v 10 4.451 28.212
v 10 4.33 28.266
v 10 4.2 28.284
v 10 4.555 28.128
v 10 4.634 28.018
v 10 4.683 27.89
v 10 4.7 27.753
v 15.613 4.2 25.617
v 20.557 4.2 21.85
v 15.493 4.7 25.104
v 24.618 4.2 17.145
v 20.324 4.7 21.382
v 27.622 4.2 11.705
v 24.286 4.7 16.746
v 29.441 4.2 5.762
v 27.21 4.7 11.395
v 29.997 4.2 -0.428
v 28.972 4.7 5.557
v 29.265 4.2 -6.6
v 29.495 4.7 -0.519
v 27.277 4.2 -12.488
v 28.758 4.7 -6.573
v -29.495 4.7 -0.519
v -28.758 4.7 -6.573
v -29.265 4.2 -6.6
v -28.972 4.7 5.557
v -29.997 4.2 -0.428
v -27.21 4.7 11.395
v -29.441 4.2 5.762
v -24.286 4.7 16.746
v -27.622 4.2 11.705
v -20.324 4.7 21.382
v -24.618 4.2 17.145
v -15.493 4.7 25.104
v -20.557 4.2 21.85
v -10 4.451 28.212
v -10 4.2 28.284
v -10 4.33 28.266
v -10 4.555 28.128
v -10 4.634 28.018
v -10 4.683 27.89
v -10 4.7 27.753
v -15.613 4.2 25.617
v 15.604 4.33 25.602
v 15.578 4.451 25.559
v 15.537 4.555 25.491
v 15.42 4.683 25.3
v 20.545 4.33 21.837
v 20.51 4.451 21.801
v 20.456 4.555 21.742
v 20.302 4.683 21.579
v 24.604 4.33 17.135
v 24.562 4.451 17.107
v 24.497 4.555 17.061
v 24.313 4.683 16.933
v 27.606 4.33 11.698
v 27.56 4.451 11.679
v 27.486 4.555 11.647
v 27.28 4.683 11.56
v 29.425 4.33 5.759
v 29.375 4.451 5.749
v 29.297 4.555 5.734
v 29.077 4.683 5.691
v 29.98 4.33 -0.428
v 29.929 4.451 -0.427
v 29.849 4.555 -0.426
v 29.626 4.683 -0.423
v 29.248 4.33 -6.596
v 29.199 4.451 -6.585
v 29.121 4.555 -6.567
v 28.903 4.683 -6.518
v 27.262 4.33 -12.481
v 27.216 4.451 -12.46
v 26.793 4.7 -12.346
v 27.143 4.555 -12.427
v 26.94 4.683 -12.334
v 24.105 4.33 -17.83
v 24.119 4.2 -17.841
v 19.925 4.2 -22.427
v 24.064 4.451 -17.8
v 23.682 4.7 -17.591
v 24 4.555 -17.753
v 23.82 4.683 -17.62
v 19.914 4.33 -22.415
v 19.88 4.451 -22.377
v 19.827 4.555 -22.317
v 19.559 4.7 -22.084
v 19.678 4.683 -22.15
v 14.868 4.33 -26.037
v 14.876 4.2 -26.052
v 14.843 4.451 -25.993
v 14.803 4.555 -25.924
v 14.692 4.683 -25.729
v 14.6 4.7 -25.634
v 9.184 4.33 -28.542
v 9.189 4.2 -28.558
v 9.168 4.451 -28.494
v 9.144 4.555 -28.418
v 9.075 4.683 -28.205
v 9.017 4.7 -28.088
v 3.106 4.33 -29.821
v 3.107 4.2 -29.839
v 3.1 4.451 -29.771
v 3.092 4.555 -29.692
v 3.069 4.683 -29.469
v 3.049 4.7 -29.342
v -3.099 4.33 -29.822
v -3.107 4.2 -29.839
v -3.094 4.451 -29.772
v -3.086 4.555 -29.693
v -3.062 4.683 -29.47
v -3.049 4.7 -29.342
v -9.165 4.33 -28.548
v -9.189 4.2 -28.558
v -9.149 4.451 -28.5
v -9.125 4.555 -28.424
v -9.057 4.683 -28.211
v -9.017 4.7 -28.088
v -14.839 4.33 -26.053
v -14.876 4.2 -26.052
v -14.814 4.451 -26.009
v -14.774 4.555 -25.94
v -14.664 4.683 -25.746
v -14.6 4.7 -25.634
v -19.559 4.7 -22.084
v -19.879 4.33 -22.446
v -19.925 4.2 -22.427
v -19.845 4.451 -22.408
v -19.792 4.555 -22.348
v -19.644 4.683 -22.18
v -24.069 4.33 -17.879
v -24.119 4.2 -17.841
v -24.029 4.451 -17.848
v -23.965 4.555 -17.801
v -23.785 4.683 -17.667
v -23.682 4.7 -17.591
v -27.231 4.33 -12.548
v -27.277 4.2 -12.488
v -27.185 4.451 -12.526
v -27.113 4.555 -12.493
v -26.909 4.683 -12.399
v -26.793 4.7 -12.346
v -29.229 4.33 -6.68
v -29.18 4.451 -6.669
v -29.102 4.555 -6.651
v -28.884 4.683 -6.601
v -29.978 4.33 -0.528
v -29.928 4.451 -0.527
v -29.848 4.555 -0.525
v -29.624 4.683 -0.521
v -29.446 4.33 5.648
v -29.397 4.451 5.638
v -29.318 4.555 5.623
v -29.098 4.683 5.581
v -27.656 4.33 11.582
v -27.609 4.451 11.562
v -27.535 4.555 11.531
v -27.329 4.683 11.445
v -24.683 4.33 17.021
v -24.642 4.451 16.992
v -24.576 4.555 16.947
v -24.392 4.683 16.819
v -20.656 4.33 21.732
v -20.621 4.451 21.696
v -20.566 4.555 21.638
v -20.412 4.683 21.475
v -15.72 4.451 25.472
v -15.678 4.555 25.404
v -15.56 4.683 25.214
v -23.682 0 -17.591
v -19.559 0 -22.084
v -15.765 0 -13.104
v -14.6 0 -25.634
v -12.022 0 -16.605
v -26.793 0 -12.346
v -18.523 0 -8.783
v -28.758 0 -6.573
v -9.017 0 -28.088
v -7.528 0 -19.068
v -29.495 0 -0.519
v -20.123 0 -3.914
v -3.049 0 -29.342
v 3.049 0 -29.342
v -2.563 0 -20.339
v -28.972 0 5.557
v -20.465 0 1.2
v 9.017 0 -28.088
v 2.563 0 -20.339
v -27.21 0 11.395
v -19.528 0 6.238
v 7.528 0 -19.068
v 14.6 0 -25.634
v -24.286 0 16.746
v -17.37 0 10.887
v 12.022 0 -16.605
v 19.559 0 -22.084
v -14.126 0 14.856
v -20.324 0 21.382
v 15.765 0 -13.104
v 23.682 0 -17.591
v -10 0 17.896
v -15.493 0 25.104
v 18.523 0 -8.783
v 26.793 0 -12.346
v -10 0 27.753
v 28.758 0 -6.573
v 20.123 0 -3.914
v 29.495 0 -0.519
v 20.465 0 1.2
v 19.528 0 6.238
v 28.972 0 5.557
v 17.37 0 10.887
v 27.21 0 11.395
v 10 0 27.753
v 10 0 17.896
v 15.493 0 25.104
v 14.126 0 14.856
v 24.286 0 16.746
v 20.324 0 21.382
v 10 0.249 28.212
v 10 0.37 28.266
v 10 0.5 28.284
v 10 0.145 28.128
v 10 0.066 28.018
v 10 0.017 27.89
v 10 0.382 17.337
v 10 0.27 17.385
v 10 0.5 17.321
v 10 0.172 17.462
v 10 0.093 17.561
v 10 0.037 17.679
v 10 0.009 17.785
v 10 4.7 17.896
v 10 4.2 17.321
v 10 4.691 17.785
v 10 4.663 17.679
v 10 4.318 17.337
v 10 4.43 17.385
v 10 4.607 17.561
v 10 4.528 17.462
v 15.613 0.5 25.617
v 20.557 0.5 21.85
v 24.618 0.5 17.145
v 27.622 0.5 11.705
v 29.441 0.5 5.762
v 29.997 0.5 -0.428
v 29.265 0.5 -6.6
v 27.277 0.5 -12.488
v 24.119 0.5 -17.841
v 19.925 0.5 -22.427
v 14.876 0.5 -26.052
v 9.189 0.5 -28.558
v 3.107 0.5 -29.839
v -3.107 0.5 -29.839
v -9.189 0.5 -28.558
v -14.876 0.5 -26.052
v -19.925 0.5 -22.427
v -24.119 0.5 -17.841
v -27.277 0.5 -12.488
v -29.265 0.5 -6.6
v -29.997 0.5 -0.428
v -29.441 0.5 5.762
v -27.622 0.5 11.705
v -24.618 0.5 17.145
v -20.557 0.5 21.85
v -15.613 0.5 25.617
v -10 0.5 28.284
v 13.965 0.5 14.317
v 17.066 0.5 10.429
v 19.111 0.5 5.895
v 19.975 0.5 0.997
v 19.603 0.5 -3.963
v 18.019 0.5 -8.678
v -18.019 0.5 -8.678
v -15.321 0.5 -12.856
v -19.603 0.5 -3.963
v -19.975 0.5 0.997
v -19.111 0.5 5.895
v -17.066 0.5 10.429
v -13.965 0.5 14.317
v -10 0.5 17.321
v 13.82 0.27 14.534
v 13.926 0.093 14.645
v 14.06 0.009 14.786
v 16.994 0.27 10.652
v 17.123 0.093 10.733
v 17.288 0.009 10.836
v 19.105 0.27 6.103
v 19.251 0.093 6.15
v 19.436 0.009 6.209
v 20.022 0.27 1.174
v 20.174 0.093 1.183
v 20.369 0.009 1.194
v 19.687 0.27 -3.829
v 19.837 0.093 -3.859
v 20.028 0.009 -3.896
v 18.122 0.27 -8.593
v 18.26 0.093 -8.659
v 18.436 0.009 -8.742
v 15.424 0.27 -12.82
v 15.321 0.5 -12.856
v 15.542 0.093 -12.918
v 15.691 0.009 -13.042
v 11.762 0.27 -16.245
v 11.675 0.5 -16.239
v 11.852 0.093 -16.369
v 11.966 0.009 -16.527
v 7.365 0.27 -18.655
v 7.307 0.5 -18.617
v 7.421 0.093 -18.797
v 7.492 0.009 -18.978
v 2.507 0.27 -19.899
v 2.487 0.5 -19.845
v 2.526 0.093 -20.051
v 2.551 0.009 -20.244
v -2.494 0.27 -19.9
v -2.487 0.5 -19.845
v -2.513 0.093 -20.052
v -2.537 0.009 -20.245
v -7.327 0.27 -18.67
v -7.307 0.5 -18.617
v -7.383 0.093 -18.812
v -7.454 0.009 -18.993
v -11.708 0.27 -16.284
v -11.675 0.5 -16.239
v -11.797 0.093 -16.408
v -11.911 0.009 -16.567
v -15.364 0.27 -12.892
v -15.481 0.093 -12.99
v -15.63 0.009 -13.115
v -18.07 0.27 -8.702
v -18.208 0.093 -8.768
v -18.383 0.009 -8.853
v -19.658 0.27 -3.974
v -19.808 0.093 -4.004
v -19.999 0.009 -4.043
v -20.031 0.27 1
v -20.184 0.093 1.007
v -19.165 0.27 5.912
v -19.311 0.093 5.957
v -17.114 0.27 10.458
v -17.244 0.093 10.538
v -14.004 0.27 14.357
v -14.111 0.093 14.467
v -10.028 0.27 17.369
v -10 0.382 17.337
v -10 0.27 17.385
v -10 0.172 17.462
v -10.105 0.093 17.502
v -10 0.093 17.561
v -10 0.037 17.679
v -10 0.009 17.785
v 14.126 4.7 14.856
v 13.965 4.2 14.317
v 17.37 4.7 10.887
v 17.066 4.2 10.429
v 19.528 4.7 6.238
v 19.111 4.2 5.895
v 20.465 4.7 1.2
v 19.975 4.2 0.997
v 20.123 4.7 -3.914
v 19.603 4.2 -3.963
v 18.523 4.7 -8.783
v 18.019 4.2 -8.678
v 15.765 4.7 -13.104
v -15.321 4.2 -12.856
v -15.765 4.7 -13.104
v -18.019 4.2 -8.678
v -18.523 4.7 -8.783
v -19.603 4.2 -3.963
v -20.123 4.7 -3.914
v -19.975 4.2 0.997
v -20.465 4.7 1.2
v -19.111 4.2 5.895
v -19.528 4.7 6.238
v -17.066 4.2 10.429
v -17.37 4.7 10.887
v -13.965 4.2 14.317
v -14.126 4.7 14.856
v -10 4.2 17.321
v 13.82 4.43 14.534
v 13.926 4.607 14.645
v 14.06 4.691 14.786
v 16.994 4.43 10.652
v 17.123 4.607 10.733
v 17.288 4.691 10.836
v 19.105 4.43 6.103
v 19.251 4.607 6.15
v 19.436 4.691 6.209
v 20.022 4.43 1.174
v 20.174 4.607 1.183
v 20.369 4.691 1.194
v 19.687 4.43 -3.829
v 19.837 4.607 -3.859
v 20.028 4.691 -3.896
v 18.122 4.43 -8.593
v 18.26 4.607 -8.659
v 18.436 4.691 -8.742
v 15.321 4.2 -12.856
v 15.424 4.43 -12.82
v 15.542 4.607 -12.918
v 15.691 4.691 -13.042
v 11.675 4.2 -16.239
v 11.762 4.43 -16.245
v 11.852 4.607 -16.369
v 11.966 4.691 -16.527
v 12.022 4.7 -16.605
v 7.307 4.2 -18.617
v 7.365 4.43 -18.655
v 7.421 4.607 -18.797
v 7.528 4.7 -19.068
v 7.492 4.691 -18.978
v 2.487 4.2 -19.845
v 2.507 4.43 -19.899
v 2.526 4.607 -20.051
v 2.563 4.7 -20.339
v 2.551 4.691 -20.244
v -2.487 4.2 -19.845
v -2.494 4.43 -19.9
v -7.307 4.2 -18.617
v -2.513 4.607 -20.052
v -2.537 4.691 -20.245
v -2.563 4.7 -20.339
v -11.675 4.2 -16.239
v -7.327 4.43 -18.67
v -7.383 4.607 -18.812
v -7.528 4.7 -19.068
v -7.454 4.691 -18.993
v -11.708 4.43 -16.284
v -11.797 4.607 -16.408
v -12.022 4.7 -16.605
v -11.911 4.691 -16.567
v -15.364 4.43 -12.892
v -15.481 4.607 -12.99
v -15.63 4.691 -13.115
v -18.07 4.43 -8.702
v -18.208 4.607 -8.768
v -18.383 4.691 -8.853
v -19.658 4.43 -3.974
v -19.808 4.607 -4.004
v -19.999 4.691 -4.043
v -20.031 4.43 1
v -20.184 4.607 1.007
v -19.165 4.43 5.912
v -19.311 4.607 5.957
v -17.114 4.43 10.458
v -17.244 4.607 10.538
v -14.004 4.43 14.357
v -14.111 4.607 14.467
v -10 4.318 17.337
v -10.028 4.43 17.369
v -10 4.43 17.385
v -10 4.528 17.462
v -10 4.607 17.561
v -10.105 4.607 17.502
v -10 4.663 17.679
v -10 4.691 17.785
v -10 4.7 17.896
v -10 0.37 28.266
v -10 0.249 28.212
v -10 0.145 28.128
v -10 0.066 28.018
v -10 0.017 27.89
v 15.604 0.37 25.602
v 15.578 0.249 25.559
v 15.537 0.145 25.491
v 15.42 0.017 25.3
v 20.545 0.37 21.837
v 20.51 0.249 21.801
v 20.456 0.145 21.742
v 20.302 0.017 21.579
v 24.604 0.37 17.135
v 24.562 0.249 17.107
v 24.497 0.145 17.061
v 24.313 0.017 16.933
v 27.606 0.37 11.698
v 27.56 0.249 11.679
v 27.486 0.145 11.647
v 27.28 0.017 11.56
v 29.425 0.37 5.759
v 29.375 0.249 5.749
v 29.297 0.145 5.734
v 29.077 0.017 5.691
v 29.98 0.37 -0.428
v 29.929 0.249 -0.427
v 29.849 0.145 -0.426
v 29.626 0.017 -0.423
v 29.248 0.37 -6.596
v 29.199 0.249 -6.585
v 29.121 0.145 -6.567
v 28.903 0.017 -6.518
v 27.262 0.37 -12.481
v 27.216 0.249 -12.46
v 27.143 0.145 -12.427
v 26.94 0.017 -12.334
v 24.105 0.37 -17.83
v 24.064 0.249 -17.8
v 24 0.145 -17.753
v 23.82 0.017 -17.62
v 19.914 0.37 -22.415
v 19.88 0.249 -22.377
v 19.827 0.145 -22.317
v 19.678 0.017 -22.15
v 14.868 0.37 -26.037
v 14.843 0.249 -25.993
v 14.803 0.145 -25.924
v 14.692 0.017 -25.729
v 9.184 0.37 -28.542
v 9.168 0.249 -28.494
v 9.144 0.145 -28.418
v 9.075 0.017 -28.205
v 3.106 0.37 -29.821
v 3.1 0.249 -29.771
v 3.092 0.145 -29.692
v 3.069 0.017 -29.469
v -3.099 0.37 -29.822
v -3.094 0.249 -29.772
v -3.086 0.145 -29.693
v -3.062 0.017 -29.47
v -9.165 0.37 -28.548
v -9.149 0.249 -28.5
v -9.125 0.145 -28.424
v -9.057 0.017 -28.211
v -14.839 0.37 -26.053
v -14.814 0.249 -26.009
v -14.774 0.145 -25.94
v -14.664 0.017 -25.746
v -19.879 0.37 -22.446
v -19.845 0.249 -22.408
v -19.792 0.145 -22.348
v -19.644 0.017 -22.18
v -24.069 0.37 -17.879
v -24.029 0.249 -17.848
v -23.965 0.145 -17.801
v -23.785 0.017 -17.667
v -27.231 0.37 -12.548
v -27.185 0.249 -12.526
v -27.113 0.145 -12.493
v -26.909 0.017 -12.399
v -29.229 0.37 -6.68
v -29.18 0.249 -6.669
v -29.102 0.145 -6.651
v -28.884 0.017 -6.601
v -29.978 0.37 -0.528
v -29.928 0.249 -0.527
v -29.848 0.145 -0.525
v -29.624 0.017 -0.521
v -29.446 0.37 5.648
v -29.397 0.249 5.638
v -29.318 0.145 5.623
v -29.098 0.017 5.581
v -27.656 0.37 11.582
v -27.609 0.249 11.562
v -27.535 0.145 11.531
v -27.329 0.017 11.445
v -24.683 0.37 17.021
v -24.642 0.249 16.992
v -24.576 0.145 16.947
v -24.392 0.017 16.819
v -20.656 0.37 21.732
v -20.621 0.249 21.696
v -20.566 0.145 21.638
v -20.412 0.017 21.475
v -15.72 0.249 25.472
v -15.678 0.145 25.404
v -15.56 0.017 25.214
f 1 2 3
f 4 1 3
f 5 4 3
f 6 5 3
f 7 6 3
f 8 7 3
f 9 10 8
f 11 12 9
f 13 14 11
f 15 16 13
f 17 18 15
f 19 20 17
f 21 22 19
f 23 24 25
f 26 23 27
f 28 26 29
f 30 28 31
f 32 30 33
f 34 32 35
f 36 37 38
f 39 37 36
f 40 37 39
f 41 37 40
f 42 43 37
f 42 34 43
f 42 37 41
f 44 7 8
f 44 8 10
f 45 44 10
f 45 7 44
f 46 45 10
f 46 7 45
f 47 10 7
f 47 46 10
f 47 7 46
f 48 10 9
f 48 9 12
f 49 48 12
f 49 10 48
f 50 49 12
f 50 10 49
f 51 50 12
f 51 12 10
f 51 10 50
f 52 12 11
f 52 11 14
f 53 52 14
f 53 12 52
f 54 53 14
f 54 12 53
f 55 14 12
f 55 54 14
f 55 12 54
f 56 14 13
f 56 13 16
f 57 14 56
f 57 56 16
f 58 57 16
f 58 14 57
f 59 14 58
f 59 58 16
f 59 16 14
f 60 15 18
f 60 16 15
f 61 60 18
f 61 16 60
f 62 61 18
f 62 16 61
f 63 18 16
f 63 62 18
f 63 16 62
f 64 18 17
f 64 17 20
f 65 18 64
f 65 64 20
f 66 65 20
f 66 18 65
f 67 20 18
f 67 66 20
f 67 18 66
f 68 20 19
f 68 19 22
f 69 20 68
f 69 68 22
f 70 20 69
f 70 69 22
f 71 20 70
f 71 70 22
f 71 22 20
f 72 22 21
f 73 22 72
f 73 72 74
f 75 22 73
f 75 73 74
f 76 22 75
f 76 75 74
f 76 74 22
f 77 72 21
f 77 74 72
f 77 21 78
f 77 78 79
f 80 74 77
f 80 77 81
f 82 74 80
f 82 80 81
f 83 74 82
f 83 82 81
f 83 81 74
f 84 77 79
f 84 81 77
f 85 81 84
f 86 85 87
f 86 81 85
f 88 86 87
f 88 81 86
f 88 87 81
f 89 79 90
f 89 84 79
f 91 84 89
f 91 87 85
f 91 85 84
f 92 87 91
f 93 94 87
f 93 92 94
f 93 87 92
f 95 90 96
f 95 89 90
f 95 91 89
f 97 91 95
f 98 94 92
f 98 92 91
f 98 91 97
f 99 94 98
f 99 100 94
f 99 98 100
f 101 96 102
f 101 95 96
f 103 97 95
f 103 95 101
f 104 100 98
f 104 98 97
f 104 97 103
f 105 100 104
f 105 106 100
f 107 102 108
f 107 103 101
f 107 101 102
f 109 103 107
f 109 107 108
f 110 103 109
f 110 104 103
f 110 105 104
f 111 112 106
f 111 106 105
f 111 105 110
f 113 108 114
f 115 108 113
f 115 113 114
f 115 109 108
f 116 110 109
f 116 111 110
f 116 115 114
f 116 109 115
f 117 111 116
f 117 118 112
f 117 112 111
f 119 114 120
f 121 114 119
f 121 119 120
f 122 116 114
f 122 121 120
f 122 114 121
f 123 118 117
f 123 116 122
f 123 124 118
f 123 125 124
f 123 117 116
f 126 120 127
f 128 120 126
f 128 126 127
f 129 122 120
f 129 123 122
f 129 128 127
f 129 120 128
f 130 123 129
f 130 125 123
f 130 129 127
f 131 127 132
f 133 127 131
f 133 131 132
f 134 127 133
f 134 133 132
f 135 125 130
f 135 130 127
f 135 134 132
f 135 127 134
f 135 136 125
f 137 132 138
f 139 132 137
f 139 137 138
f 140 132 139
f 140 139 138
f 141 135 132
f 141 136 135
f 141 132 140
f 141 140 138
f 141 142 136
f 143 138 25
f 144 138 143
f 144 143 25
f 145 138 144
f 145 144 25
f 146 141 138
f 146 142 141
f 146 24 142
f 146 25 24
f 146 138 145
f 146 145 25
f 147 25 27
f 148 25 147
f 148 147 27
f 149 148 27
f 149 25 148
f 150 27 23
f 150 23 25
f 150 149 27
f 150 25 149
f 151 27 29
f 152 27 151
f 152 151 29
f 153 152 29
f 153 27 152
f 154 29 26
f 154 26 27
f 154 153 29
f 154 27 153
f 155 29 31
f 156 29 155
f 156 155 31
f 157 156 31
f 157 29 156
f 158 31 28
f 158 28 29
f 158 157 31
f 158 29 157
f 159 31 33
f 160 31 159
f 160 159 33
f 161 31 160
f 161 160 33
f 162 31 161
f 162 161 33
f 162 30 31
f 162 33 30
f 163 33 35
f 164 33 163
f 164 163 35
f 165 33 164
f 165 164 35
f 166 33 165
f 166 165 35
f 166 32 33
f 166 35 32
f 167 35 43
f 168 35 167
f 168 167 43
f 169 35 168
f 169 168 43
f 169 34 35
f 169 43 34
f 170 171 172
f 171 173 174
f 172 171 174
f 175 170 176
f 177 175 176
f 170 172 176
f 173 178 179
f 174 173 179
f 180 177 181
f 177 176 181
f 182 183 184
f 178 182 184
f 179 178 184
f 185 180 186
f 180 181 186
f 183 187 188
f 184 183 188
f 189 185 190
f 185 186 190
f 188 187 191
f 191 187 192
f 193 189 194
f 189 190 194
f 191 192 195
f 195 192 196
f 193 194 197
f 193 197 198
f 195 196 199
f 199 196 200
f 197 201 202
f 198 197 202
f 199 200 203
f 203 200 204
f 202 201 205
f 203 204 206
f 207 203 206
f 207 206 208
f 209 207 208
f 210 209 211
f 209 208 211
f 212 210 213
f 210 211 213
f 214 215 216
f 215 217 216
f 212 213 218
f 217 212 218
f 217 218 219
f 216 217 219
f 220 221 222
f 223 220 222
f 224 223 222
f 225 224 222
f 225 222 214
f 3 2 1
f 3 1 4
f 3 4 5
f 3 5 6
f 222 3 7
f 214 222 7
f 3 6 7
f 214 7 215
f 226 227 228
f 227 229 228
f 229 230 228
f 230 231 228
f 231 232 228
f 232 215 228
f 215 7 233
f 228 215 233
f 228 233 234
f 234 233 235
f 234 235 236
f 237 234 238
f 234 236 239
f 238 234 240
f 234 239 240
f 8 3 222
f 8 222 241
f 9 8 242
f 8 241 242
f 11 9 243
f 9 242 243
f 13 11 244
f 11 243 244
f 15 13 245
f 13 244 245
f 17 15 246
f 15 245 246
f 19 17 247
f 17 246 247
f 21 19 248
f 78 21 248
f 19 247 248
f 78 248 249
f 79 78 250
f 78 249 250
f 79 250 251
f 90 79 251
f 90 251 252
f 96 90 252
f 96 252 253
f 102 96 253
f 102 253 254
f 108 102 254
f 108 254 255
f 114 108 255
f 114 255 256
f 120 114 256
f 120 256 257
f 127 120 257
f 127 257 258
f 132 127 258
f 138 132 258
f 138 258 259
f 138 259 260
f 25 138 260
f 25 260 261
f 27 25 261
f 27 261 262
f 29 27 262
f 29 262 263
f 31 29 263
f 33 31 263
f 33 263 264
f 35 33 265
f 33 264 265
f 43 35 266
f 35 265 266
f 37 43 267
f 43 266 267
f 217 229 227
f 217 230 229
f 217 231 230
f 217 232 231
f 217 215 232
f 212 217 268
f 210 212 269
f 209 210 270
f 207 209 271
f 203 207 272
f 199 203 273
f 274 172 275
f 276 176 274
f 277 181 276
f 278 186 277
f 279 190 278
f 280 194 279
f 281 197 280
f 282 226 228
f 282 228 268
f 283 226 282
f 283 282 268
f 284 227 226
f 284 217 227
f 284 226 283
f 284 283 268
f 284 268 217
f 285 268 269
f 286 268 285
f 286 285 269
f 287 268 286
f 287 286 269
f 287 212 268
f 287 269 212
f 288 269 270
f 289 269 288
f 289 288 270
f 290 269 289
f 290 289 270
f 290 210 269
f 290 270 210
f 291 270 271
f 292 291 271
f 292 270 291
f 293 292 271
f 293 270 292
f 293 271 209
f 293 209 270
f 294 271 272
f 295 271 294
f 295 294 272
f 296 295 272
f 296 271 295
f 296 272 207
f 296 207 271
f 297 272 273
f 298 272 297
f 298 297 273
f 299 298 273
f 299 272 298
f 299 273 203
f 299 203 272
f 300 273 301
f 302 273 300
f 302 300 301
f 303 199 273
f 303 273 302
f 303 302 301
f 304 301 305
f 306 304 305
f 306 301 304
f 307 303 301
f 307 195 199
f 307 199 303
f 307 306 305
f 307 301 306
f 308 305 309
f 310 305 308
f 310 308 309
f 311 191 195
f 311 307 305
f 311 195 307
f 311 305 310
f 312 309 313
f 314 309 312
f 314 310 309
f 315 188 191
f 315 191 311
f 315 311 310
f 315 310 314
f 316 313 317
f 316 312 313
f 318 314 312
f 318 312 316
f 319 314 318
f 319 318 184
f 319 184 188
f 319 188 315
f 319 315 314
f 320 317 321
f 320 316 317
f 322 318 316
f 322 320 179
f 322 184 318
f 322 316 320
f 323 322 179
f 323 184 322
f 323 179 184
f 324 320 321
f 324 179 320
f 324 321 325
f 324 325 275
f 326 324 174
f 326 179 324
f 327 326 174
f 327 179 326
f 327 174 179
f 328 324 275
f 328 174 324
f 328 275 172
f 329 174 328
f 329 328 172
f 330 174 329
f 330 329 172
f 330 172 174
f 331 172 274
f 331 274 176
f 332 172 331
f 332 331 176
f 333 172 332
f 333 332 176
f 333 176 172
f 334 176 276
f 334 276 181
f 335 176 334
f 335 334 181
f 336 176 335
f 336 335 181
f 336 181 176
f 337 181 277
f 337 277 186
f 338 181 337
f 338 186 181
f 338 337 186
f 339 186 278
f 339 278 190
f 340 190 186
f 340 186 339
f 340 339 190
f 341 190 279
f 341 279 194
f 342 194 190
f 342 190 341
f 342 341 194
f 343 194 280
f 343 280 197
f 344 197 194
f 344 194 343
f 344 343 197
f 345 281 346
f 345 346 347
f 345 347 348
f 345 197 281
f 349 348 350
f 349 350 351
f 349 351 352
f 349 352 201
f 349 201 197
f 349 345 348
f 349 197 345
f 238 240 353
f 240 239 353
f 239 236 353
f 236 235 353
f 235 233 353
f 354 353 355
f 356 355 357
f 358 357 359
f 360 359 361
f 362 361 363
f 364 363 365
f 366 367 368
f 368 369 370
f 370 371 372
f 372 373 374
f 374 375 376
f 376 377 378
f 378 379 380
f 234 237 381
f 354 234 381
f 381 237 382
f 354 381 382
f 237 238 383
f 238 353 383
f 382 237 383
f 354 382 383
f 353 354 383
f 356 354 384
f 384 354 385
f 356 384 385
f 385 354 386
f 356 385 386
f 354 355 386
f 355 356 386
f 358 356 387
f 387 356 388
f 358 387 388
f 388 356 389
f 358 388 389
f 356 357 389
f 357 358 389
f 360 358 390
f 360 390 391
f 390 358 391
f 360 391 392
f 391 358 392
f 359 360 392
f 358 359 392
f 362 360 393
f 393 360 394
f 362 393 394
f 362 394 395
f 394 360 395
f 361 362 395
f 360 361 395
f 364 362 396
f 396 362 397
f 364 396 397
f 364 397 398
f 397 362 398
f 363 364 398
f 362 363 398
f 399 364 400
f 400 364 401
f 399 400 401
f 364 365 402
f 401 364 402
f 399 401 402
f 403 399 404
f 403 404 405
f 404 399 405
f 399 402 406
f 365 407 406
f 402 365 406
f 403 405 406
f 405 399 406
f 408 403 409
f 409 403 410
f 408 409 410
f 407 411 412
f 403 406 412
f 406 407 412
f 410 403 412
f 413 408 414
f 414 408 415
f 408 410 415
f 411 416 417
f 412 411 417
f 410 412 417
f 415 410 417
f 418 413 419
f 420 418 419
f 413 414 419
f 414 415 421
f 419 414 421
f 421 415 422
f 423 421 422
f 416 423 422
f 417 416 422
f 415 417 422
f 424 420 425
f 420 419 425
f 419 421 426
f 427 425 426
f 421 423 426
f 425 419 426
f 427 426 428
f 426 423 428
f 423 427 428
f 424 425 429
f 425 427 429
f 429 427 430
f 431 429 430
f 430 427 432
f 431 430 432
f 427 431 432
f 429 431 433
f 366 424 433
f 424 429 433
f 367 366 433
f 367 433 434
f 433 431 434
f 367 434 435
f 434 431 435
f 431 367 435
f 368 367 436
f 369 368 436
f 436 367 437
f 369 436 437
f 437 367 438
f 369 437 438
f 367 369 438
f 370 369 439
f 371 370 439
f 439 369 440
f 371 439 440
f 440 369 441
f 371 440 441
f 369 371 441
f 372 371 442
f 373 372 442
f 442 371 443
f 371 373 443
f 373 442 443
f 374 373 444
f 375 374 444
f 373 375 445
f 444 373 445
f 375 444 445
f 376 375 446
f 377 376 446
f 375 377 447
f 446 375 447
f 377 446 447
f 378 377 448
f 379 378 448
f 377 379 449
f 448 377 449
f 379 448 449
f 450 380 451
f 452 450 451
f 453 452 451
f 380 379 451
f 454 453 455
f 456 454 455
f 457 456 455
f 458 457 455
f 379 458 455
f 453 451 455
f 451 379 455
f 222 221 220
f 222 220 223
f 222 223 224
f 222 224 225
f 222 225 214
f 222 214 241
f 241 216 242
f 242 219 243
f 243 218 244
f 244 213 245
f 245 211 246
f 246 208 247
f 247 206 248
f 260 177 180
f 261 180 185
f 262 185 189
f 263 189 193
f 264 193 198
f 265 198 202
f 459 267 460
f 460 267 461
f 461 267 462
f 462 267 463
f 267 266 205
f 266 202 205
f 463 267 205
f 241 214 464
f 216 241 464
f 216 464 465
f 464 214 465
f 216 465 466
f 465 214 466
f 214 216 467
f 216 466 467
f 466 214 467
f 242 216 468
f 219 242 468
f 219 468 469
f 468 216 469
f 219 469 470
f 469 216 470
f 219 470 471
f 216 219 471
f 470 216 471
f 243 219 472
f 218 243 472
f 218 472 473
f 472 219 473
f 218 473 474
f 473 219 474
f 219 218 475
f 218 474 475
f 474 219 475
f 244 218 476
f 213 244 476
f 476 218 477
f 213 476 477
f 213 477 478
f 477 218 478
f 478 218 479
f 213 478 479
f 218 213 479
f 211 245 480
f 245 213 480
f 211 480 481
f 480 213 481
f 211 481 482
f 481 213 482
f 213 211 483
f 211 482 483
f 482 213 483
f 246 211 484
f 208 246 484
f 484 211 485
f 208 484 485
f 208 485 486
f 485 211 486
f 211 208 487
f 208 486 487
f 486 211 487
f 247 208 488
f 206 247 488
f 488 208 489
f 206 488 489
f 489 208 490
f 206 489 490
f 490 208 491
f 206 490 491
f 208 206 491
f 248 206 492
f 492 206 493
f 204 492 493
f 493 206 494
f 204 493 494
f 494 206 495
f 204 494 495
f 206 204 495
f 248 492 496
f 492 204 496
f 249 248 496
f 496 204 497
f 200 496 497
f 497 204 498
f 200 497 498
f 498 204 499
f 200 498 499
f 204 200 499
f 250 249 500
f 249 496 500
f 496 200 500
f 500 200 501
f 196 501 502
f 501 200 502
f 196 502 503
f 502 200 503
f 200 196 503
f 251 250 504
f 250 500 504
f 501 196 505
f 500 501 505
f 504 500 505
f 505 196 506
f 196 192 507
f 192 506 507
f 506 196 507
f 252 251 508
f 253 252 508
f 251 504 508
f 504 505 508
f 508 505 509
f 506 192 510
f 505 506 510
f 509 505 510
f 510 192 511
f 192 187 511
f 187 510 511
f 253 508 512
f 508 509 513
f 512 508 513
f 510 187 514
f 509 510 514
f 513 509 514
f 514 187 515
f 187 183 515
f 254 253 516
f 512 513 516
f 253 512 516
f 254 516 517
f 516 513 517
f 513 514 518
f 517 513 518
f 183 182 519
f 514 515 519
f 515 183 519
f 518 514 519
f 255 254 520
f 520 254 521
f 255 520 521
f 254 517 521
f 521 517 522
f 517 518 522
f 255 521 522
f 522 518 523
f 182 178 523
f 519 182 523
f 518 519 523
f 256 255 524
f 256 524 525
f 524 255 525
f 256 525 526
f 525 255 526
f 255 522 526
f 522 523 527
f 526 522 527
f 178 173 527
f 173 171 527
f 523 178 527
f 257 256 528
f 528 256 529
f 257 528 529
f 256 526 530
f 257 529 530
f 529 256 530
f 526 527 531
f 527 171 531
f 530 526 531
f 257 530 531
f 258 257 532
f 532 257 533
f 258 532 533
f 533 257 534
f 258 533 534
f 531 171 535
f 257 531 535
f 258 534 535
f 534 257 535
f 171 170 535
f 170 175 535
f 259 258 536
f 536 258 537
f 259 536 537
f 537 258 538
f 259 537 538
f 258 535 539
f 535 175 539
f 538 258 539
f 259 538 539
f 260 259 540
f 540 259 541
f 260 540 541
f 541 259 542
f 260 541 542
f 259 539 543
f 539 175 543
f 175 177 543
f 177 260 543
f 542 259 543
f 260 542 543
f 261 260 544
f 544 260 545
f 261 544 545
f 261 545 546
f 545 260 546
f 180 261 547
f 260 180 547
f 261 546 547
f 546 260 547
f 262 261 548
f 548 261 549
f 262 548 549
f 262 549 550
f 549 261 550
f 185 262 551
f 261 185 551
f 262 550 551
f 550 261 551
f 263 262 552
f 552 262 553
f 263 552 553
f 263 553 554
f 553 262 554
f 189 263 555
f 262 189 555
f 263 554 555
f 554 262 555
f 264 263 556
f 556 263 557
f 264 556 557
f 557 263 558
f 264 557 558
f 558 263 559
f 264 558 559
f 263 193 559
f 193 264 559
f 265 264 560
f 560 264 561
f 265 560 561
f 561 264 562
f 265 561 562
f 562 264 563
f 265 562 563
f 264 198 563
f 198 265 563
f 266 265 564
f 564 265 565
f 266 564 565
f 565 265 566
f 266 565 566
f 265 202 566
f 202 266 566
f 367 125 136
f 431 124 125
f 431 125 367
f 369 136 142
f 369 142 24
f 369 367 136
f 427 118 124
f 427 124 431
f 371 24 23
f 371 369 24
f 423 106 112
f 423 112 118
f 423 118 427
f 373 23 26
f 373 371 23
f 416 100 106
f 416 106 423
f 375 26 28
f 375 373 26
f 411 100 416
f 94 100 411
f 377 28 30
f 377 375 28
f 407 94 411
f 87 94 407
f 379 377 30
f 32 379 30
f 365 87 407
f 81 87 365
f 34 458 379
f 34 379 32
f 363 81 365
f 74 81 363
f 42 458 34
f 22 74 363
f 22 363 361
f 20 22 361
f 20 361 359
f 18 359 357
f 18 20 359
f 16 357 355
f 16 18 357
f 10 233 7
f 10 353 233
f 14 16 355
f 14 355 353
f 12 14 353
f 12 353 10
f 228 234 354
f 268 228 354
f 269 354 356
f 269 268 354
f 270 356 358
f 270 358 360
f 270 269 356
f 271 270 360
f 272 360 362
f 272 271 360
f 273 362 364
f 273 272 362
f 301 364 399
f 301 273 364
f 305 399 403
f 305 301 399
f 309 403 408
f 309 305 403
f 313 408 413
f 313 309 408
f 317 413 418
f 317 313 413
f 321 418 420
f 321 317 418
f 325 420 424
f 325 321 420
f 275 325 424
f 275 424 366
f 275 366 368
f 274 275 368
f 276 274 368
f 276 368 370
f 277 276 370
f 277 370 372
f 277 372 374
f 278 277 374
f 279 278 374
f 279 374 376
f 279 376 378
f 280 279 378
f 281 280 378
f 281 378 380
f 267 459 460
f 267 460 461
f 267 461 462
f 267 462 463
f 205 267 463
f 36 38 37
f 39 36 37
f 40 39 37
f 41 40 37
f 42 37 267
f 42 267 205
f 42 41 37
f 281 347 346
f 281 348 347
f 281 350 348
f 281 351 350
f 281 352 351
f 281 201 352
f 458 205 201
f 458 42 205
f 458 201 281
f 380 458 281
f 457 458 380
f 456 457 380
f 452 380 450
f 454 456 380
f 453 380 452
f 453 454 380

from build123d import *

# Parameters (mm, degrees)
SKETCH1_R           = 30
SKETCH1_R_2         = 20
BOSS_EXTRUDE1_DEPTH = 4.7
FILLET1_R           = 0.5
SKETCH2_W           = 20
SKETCH2_H           = 12.679491924
CUT_EXTRUDE1_DEPTH  = 43.685946165


with BuildPart() as part:
    # Sketch1 → Boss-Extrude1 (new body)
    with BuildSketch(Plane(origin=(0, 0, 0), x_dir=(1, 0, 0), z_dir=(0, 1, 0))):
        with Locations(Location((0, 0, 0), (0, 0, 270))):
            Circle(SKETCH1_R)
        with Locations(Location((0, 0, 0), (0, 0, 270))):
            Circle(SKETCH1_R_2, mode=Mode.SUBTRACT)
    extrude(amount=BOSS_EXTRUDE1_DEPTH)

    # Fillet1
    fillet1_edges = [part.edges().sort_by_distance(p)[0] for p in [
        (0, 0, -30),
        (0, 4.7, -30),
        (0, 0, -20),
        (0, 4.7, -20),
    ]]
    fillet(fillet1_edges, radius=FILLET1_R)

    # Sketch2 → Cut-Extrude1 (cut, through all)
    with BuildSketch(Plane(origin=(0, 4.7, 0), x_dir=(1, 0, 0), z_dir=(0, 1, 0))):
        with Locations((0, -23.660254038)):
            Rectangle(SKETCH2_W, SKETCH2_H)
    extrude(amount=-CUT_EXTRUDE1_DEPTH, mode=Mode.SUBTRACT)


solid = part.part
